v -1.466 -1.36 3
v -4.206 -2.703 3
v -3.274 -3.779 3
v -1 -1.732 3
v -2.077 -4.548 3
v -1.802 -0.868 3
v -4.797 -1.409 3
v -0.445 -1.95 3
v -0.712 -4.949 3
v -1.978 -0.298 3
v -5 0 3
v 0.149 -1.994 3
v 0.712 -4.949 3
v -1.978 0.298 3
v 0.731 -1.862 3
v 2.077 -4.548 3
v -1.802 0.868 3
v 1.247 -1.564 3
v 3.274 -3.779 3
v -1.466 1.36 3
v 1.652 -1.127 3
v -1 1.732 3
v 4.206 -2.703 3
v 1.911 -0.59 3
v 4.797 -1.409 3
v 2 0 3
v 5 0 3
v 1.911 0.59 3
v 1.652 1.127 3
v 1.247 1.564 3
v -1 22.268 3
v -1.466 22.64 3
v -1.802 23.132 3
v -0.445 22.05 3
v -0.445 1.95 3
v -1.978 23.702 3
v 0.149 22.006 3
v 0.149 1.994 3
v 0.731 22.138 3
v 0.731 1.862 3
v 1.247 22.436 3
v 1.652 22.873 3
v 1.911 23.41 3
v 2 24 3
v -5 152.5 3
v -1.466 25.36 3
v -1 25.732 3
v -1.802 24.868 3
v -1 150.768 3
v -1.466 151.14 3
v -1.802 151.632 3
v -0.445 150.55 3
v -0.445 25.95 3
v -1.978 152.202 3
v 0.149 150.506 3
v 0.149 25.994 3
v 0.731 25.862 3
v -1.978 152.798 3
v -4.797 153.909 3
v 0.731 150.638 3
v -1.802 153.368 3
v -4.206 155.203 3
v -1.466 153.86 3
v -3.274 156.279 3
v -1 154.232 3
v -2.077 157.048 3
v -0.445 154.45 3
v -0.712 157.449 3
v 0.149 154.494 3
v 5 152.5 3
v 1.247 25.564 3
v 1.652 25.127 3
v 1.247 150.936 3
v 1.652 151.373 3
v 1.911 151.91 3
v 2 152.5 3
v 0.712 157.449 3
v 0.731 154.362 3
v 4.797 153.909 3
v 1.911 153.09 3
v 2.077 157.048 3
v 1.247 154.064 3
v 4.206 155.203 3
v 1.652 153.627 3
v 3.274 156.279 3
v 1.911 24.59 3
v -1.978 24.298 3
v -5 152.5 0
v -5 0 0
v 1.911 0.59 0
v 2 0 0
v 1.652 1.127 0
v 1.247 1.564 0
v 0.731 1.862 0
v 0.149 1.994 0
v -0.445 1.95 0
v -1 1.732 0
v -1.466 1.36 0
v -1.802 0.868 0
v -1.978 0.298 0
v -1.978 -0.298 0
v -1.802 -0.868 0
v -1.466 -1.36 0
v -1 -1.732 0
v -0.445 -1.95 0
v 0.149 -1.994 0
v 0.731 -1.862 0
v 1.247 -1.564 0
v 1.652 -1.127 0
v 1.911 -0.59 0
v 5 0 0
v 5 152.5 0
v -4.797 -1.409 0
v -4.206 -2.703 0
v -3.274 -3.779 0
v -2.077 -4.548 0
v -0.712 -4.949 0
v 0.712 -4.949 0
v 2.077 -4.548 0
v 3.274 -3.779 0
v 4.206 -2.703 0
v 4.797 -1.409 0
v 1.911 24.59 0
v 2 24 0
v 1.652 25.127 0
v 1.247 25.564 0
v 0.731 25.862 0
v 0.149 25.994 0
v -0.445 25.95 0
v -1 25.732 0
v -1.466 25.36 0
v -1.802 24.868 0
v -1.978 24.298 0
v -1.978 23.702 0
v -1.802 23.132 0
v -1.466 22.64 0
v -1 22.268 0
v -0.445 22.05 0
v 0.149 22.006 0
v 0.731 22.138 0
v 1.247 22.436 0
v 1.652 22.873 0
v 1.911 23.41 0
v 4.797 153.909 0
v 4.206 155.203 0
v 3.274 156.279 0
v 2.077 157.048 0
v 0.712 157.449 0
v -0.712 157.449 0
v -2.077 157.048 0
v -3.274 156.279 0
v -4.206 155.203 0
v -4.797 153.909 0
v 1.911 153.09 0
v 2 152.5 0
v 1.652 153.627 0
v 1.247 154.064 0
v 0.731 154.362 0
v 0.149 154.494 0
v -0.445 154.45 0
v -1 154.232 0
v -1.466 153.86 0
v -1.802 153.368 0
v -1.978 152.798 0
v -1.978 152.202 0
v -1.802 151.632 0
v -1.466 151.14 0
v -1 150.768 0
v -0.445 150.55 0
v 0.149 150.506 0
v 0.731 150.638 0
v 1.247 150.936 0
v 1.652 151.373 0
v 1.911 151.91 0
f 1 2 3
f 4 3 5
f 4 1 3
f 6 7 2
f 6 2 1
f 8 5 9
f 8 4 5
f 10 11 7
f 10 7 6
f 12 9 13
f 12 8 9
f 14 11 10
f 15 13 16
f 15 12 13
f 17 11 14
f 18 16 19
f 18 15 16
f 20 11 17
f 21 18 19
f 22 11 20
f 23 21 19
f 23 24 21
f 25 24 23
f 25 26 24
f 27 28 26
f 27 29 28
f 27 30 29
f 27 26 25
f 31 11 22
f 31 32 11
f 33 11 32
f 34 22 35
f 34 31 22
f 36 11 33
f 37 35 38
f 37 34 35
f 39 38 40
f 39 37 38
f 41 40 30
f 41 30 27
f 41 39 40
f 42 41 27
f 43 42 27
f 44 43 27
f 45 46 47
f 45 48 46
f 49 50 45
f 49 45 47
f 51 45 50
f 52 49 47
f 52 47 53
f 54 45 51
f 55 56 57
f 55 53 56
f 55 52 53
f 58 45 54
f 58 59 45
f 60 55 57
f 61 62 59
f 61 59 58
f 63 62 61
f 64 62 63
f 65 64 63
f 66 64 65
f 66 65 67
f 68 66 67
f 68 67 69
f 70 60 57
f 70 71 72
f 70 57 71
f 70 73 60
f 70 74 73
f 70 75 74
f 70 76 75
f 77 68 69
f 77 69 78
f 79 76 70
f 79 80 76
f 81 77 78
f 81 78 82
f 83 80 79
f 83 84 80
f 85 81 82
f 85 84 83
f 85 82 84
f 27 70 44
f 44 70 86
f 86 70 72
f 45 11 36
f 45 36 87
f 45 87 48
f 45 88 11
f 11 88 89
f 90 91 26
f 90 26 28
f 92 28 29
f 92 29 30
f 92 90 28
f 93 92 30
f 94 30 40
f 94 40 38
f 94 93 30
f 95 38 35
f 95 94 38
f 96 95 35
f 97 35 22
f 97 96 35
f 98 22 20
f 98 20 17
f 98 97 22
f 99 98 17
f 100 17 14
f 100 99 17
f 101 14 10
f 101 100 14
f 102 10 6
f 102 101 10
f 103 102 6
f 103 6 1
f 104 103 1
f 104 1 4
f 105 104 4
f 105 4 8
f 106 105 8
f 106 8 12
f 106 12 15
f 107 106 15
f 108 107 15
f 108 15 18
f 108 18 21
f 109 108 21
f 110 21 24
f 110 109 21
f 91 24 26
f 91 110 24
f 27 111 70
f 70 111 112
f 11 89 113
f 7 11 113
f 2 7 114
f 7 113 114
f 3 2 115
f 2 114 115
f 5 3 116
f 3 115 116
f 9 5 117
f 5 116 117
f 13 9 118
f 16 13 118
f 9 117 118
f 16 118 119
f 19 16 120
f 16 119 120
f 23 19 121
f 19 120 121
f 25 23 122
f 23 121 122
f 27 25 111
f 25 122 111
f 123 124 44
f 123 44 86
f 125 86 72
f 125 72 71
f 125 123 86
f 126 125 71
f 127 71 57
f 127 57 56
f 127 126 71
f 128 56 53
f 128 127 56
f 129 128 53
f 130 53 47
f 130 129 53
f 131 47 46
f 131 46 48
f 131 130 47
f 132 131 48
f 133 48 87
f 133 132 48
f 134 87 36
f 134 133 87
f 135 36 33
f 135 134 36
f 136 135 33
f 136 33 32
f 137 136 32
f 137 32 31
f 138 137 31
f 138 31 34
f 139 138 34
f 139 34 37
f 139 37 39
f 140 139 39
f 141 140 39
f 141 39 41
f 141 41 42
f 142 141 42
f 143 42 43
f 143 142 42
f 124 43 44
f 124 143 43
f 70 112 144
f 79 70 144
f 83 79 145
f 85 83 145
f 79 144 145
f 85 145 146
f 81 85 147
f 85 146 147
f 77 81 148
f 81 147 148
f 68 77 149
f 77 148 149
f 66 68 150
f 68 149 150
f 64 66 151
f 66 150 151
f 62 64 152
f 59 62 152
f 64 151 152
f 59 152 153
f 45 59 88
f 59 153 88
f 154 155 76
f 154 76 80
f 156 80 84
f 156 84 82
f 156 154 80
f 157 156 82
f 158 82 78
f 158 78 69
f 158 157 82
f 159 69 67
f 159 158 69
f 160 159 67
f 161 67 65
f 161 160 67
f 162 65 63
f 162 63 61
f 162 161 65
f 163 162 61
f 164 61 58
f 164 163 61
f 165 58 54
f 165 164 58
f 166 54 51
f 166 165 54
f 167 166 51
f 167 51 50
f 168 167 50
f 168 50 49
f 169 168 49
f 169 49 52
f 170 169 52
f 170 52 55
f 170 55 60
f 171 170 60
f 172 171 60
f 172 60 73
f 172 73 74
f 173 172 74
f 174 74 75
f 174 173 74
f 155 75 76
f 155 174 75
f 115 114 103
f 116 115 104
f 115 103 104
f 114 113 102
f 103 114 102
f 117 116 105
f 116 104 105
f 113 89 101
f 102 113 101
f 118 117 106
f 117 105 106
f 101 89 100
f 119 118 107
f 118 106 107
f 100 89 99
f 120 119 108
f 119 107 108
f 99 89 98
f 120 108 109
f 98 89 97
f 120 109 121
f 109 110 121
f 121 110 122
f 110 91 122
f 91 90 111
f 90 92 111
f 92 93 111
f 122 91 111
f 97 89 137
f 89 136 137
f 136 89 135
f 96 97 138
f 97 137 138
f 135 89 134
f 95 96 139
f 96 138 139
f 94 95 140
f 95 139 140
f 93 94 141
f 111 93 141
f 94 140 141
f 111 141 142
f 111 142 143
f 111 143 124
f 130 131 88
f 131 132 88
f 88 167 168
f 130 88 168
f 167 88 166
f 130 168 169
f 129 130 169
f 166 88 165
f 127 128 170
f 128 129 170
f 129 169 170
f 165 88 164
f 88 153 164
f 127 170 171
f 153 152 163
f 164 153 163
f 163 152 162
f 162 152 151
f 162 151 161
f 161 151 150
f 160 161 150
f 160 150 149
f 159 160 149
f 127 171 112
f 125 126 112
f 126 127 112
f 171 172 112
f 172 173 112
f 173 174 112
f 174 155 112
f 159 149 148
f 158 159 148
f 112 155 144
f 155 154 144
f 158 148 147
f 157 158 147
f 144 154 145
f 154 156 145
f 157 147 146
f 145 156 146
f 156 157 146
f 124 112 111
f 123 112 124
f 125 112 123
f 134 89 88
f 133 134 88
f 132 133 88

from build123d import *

# Parameters (mm, degrees)
SKETCH1_R           = 2
SKETCH1_R_2         = 5
BOSS_EXTRUDE1_DEPTH = 3


with BuildPart() as part:
    # Sketch1 → Boss-Extrude1 (new body)
    # profile 1 of 3: a face of its own
    with BuildSketch(Plane.XY):
        with BuildLine():
            Line((-5, 152.5), (-5, 0))
            ThreePointArc((-5, 0), (0, 5), (5, 0))
            Line((5, 0), (5, 152.5))
            ThreePointArc((5, 152.5), (0, 147.5), (-5, 152.5))
        make_face()
        with Locations((0, 24)):
            Circle(SKETCH1_R, mode=Mode.SUBTRACT)
    # profile 2 of 3: a face of its own
    with BuildSketch(Plane.XY):
        with Locations((0, 152.5)):
            Circle(SKETCH1_R_2)
        with Locations((0, 152.5)):
            Circle(SKETCH1_R, mode=Mode.SUBTRACT)
    # profile 3 of 3: a face of its own
    with BuildSketch(Plane.XY):
        Circle(SKETCH1_R_2)
        Circle(SKETCH1_R, mode=Mode.SUBTRACT)
    extrude(amount=BOSS_EXTRUDE1_DEPTH)


solid = part.part
